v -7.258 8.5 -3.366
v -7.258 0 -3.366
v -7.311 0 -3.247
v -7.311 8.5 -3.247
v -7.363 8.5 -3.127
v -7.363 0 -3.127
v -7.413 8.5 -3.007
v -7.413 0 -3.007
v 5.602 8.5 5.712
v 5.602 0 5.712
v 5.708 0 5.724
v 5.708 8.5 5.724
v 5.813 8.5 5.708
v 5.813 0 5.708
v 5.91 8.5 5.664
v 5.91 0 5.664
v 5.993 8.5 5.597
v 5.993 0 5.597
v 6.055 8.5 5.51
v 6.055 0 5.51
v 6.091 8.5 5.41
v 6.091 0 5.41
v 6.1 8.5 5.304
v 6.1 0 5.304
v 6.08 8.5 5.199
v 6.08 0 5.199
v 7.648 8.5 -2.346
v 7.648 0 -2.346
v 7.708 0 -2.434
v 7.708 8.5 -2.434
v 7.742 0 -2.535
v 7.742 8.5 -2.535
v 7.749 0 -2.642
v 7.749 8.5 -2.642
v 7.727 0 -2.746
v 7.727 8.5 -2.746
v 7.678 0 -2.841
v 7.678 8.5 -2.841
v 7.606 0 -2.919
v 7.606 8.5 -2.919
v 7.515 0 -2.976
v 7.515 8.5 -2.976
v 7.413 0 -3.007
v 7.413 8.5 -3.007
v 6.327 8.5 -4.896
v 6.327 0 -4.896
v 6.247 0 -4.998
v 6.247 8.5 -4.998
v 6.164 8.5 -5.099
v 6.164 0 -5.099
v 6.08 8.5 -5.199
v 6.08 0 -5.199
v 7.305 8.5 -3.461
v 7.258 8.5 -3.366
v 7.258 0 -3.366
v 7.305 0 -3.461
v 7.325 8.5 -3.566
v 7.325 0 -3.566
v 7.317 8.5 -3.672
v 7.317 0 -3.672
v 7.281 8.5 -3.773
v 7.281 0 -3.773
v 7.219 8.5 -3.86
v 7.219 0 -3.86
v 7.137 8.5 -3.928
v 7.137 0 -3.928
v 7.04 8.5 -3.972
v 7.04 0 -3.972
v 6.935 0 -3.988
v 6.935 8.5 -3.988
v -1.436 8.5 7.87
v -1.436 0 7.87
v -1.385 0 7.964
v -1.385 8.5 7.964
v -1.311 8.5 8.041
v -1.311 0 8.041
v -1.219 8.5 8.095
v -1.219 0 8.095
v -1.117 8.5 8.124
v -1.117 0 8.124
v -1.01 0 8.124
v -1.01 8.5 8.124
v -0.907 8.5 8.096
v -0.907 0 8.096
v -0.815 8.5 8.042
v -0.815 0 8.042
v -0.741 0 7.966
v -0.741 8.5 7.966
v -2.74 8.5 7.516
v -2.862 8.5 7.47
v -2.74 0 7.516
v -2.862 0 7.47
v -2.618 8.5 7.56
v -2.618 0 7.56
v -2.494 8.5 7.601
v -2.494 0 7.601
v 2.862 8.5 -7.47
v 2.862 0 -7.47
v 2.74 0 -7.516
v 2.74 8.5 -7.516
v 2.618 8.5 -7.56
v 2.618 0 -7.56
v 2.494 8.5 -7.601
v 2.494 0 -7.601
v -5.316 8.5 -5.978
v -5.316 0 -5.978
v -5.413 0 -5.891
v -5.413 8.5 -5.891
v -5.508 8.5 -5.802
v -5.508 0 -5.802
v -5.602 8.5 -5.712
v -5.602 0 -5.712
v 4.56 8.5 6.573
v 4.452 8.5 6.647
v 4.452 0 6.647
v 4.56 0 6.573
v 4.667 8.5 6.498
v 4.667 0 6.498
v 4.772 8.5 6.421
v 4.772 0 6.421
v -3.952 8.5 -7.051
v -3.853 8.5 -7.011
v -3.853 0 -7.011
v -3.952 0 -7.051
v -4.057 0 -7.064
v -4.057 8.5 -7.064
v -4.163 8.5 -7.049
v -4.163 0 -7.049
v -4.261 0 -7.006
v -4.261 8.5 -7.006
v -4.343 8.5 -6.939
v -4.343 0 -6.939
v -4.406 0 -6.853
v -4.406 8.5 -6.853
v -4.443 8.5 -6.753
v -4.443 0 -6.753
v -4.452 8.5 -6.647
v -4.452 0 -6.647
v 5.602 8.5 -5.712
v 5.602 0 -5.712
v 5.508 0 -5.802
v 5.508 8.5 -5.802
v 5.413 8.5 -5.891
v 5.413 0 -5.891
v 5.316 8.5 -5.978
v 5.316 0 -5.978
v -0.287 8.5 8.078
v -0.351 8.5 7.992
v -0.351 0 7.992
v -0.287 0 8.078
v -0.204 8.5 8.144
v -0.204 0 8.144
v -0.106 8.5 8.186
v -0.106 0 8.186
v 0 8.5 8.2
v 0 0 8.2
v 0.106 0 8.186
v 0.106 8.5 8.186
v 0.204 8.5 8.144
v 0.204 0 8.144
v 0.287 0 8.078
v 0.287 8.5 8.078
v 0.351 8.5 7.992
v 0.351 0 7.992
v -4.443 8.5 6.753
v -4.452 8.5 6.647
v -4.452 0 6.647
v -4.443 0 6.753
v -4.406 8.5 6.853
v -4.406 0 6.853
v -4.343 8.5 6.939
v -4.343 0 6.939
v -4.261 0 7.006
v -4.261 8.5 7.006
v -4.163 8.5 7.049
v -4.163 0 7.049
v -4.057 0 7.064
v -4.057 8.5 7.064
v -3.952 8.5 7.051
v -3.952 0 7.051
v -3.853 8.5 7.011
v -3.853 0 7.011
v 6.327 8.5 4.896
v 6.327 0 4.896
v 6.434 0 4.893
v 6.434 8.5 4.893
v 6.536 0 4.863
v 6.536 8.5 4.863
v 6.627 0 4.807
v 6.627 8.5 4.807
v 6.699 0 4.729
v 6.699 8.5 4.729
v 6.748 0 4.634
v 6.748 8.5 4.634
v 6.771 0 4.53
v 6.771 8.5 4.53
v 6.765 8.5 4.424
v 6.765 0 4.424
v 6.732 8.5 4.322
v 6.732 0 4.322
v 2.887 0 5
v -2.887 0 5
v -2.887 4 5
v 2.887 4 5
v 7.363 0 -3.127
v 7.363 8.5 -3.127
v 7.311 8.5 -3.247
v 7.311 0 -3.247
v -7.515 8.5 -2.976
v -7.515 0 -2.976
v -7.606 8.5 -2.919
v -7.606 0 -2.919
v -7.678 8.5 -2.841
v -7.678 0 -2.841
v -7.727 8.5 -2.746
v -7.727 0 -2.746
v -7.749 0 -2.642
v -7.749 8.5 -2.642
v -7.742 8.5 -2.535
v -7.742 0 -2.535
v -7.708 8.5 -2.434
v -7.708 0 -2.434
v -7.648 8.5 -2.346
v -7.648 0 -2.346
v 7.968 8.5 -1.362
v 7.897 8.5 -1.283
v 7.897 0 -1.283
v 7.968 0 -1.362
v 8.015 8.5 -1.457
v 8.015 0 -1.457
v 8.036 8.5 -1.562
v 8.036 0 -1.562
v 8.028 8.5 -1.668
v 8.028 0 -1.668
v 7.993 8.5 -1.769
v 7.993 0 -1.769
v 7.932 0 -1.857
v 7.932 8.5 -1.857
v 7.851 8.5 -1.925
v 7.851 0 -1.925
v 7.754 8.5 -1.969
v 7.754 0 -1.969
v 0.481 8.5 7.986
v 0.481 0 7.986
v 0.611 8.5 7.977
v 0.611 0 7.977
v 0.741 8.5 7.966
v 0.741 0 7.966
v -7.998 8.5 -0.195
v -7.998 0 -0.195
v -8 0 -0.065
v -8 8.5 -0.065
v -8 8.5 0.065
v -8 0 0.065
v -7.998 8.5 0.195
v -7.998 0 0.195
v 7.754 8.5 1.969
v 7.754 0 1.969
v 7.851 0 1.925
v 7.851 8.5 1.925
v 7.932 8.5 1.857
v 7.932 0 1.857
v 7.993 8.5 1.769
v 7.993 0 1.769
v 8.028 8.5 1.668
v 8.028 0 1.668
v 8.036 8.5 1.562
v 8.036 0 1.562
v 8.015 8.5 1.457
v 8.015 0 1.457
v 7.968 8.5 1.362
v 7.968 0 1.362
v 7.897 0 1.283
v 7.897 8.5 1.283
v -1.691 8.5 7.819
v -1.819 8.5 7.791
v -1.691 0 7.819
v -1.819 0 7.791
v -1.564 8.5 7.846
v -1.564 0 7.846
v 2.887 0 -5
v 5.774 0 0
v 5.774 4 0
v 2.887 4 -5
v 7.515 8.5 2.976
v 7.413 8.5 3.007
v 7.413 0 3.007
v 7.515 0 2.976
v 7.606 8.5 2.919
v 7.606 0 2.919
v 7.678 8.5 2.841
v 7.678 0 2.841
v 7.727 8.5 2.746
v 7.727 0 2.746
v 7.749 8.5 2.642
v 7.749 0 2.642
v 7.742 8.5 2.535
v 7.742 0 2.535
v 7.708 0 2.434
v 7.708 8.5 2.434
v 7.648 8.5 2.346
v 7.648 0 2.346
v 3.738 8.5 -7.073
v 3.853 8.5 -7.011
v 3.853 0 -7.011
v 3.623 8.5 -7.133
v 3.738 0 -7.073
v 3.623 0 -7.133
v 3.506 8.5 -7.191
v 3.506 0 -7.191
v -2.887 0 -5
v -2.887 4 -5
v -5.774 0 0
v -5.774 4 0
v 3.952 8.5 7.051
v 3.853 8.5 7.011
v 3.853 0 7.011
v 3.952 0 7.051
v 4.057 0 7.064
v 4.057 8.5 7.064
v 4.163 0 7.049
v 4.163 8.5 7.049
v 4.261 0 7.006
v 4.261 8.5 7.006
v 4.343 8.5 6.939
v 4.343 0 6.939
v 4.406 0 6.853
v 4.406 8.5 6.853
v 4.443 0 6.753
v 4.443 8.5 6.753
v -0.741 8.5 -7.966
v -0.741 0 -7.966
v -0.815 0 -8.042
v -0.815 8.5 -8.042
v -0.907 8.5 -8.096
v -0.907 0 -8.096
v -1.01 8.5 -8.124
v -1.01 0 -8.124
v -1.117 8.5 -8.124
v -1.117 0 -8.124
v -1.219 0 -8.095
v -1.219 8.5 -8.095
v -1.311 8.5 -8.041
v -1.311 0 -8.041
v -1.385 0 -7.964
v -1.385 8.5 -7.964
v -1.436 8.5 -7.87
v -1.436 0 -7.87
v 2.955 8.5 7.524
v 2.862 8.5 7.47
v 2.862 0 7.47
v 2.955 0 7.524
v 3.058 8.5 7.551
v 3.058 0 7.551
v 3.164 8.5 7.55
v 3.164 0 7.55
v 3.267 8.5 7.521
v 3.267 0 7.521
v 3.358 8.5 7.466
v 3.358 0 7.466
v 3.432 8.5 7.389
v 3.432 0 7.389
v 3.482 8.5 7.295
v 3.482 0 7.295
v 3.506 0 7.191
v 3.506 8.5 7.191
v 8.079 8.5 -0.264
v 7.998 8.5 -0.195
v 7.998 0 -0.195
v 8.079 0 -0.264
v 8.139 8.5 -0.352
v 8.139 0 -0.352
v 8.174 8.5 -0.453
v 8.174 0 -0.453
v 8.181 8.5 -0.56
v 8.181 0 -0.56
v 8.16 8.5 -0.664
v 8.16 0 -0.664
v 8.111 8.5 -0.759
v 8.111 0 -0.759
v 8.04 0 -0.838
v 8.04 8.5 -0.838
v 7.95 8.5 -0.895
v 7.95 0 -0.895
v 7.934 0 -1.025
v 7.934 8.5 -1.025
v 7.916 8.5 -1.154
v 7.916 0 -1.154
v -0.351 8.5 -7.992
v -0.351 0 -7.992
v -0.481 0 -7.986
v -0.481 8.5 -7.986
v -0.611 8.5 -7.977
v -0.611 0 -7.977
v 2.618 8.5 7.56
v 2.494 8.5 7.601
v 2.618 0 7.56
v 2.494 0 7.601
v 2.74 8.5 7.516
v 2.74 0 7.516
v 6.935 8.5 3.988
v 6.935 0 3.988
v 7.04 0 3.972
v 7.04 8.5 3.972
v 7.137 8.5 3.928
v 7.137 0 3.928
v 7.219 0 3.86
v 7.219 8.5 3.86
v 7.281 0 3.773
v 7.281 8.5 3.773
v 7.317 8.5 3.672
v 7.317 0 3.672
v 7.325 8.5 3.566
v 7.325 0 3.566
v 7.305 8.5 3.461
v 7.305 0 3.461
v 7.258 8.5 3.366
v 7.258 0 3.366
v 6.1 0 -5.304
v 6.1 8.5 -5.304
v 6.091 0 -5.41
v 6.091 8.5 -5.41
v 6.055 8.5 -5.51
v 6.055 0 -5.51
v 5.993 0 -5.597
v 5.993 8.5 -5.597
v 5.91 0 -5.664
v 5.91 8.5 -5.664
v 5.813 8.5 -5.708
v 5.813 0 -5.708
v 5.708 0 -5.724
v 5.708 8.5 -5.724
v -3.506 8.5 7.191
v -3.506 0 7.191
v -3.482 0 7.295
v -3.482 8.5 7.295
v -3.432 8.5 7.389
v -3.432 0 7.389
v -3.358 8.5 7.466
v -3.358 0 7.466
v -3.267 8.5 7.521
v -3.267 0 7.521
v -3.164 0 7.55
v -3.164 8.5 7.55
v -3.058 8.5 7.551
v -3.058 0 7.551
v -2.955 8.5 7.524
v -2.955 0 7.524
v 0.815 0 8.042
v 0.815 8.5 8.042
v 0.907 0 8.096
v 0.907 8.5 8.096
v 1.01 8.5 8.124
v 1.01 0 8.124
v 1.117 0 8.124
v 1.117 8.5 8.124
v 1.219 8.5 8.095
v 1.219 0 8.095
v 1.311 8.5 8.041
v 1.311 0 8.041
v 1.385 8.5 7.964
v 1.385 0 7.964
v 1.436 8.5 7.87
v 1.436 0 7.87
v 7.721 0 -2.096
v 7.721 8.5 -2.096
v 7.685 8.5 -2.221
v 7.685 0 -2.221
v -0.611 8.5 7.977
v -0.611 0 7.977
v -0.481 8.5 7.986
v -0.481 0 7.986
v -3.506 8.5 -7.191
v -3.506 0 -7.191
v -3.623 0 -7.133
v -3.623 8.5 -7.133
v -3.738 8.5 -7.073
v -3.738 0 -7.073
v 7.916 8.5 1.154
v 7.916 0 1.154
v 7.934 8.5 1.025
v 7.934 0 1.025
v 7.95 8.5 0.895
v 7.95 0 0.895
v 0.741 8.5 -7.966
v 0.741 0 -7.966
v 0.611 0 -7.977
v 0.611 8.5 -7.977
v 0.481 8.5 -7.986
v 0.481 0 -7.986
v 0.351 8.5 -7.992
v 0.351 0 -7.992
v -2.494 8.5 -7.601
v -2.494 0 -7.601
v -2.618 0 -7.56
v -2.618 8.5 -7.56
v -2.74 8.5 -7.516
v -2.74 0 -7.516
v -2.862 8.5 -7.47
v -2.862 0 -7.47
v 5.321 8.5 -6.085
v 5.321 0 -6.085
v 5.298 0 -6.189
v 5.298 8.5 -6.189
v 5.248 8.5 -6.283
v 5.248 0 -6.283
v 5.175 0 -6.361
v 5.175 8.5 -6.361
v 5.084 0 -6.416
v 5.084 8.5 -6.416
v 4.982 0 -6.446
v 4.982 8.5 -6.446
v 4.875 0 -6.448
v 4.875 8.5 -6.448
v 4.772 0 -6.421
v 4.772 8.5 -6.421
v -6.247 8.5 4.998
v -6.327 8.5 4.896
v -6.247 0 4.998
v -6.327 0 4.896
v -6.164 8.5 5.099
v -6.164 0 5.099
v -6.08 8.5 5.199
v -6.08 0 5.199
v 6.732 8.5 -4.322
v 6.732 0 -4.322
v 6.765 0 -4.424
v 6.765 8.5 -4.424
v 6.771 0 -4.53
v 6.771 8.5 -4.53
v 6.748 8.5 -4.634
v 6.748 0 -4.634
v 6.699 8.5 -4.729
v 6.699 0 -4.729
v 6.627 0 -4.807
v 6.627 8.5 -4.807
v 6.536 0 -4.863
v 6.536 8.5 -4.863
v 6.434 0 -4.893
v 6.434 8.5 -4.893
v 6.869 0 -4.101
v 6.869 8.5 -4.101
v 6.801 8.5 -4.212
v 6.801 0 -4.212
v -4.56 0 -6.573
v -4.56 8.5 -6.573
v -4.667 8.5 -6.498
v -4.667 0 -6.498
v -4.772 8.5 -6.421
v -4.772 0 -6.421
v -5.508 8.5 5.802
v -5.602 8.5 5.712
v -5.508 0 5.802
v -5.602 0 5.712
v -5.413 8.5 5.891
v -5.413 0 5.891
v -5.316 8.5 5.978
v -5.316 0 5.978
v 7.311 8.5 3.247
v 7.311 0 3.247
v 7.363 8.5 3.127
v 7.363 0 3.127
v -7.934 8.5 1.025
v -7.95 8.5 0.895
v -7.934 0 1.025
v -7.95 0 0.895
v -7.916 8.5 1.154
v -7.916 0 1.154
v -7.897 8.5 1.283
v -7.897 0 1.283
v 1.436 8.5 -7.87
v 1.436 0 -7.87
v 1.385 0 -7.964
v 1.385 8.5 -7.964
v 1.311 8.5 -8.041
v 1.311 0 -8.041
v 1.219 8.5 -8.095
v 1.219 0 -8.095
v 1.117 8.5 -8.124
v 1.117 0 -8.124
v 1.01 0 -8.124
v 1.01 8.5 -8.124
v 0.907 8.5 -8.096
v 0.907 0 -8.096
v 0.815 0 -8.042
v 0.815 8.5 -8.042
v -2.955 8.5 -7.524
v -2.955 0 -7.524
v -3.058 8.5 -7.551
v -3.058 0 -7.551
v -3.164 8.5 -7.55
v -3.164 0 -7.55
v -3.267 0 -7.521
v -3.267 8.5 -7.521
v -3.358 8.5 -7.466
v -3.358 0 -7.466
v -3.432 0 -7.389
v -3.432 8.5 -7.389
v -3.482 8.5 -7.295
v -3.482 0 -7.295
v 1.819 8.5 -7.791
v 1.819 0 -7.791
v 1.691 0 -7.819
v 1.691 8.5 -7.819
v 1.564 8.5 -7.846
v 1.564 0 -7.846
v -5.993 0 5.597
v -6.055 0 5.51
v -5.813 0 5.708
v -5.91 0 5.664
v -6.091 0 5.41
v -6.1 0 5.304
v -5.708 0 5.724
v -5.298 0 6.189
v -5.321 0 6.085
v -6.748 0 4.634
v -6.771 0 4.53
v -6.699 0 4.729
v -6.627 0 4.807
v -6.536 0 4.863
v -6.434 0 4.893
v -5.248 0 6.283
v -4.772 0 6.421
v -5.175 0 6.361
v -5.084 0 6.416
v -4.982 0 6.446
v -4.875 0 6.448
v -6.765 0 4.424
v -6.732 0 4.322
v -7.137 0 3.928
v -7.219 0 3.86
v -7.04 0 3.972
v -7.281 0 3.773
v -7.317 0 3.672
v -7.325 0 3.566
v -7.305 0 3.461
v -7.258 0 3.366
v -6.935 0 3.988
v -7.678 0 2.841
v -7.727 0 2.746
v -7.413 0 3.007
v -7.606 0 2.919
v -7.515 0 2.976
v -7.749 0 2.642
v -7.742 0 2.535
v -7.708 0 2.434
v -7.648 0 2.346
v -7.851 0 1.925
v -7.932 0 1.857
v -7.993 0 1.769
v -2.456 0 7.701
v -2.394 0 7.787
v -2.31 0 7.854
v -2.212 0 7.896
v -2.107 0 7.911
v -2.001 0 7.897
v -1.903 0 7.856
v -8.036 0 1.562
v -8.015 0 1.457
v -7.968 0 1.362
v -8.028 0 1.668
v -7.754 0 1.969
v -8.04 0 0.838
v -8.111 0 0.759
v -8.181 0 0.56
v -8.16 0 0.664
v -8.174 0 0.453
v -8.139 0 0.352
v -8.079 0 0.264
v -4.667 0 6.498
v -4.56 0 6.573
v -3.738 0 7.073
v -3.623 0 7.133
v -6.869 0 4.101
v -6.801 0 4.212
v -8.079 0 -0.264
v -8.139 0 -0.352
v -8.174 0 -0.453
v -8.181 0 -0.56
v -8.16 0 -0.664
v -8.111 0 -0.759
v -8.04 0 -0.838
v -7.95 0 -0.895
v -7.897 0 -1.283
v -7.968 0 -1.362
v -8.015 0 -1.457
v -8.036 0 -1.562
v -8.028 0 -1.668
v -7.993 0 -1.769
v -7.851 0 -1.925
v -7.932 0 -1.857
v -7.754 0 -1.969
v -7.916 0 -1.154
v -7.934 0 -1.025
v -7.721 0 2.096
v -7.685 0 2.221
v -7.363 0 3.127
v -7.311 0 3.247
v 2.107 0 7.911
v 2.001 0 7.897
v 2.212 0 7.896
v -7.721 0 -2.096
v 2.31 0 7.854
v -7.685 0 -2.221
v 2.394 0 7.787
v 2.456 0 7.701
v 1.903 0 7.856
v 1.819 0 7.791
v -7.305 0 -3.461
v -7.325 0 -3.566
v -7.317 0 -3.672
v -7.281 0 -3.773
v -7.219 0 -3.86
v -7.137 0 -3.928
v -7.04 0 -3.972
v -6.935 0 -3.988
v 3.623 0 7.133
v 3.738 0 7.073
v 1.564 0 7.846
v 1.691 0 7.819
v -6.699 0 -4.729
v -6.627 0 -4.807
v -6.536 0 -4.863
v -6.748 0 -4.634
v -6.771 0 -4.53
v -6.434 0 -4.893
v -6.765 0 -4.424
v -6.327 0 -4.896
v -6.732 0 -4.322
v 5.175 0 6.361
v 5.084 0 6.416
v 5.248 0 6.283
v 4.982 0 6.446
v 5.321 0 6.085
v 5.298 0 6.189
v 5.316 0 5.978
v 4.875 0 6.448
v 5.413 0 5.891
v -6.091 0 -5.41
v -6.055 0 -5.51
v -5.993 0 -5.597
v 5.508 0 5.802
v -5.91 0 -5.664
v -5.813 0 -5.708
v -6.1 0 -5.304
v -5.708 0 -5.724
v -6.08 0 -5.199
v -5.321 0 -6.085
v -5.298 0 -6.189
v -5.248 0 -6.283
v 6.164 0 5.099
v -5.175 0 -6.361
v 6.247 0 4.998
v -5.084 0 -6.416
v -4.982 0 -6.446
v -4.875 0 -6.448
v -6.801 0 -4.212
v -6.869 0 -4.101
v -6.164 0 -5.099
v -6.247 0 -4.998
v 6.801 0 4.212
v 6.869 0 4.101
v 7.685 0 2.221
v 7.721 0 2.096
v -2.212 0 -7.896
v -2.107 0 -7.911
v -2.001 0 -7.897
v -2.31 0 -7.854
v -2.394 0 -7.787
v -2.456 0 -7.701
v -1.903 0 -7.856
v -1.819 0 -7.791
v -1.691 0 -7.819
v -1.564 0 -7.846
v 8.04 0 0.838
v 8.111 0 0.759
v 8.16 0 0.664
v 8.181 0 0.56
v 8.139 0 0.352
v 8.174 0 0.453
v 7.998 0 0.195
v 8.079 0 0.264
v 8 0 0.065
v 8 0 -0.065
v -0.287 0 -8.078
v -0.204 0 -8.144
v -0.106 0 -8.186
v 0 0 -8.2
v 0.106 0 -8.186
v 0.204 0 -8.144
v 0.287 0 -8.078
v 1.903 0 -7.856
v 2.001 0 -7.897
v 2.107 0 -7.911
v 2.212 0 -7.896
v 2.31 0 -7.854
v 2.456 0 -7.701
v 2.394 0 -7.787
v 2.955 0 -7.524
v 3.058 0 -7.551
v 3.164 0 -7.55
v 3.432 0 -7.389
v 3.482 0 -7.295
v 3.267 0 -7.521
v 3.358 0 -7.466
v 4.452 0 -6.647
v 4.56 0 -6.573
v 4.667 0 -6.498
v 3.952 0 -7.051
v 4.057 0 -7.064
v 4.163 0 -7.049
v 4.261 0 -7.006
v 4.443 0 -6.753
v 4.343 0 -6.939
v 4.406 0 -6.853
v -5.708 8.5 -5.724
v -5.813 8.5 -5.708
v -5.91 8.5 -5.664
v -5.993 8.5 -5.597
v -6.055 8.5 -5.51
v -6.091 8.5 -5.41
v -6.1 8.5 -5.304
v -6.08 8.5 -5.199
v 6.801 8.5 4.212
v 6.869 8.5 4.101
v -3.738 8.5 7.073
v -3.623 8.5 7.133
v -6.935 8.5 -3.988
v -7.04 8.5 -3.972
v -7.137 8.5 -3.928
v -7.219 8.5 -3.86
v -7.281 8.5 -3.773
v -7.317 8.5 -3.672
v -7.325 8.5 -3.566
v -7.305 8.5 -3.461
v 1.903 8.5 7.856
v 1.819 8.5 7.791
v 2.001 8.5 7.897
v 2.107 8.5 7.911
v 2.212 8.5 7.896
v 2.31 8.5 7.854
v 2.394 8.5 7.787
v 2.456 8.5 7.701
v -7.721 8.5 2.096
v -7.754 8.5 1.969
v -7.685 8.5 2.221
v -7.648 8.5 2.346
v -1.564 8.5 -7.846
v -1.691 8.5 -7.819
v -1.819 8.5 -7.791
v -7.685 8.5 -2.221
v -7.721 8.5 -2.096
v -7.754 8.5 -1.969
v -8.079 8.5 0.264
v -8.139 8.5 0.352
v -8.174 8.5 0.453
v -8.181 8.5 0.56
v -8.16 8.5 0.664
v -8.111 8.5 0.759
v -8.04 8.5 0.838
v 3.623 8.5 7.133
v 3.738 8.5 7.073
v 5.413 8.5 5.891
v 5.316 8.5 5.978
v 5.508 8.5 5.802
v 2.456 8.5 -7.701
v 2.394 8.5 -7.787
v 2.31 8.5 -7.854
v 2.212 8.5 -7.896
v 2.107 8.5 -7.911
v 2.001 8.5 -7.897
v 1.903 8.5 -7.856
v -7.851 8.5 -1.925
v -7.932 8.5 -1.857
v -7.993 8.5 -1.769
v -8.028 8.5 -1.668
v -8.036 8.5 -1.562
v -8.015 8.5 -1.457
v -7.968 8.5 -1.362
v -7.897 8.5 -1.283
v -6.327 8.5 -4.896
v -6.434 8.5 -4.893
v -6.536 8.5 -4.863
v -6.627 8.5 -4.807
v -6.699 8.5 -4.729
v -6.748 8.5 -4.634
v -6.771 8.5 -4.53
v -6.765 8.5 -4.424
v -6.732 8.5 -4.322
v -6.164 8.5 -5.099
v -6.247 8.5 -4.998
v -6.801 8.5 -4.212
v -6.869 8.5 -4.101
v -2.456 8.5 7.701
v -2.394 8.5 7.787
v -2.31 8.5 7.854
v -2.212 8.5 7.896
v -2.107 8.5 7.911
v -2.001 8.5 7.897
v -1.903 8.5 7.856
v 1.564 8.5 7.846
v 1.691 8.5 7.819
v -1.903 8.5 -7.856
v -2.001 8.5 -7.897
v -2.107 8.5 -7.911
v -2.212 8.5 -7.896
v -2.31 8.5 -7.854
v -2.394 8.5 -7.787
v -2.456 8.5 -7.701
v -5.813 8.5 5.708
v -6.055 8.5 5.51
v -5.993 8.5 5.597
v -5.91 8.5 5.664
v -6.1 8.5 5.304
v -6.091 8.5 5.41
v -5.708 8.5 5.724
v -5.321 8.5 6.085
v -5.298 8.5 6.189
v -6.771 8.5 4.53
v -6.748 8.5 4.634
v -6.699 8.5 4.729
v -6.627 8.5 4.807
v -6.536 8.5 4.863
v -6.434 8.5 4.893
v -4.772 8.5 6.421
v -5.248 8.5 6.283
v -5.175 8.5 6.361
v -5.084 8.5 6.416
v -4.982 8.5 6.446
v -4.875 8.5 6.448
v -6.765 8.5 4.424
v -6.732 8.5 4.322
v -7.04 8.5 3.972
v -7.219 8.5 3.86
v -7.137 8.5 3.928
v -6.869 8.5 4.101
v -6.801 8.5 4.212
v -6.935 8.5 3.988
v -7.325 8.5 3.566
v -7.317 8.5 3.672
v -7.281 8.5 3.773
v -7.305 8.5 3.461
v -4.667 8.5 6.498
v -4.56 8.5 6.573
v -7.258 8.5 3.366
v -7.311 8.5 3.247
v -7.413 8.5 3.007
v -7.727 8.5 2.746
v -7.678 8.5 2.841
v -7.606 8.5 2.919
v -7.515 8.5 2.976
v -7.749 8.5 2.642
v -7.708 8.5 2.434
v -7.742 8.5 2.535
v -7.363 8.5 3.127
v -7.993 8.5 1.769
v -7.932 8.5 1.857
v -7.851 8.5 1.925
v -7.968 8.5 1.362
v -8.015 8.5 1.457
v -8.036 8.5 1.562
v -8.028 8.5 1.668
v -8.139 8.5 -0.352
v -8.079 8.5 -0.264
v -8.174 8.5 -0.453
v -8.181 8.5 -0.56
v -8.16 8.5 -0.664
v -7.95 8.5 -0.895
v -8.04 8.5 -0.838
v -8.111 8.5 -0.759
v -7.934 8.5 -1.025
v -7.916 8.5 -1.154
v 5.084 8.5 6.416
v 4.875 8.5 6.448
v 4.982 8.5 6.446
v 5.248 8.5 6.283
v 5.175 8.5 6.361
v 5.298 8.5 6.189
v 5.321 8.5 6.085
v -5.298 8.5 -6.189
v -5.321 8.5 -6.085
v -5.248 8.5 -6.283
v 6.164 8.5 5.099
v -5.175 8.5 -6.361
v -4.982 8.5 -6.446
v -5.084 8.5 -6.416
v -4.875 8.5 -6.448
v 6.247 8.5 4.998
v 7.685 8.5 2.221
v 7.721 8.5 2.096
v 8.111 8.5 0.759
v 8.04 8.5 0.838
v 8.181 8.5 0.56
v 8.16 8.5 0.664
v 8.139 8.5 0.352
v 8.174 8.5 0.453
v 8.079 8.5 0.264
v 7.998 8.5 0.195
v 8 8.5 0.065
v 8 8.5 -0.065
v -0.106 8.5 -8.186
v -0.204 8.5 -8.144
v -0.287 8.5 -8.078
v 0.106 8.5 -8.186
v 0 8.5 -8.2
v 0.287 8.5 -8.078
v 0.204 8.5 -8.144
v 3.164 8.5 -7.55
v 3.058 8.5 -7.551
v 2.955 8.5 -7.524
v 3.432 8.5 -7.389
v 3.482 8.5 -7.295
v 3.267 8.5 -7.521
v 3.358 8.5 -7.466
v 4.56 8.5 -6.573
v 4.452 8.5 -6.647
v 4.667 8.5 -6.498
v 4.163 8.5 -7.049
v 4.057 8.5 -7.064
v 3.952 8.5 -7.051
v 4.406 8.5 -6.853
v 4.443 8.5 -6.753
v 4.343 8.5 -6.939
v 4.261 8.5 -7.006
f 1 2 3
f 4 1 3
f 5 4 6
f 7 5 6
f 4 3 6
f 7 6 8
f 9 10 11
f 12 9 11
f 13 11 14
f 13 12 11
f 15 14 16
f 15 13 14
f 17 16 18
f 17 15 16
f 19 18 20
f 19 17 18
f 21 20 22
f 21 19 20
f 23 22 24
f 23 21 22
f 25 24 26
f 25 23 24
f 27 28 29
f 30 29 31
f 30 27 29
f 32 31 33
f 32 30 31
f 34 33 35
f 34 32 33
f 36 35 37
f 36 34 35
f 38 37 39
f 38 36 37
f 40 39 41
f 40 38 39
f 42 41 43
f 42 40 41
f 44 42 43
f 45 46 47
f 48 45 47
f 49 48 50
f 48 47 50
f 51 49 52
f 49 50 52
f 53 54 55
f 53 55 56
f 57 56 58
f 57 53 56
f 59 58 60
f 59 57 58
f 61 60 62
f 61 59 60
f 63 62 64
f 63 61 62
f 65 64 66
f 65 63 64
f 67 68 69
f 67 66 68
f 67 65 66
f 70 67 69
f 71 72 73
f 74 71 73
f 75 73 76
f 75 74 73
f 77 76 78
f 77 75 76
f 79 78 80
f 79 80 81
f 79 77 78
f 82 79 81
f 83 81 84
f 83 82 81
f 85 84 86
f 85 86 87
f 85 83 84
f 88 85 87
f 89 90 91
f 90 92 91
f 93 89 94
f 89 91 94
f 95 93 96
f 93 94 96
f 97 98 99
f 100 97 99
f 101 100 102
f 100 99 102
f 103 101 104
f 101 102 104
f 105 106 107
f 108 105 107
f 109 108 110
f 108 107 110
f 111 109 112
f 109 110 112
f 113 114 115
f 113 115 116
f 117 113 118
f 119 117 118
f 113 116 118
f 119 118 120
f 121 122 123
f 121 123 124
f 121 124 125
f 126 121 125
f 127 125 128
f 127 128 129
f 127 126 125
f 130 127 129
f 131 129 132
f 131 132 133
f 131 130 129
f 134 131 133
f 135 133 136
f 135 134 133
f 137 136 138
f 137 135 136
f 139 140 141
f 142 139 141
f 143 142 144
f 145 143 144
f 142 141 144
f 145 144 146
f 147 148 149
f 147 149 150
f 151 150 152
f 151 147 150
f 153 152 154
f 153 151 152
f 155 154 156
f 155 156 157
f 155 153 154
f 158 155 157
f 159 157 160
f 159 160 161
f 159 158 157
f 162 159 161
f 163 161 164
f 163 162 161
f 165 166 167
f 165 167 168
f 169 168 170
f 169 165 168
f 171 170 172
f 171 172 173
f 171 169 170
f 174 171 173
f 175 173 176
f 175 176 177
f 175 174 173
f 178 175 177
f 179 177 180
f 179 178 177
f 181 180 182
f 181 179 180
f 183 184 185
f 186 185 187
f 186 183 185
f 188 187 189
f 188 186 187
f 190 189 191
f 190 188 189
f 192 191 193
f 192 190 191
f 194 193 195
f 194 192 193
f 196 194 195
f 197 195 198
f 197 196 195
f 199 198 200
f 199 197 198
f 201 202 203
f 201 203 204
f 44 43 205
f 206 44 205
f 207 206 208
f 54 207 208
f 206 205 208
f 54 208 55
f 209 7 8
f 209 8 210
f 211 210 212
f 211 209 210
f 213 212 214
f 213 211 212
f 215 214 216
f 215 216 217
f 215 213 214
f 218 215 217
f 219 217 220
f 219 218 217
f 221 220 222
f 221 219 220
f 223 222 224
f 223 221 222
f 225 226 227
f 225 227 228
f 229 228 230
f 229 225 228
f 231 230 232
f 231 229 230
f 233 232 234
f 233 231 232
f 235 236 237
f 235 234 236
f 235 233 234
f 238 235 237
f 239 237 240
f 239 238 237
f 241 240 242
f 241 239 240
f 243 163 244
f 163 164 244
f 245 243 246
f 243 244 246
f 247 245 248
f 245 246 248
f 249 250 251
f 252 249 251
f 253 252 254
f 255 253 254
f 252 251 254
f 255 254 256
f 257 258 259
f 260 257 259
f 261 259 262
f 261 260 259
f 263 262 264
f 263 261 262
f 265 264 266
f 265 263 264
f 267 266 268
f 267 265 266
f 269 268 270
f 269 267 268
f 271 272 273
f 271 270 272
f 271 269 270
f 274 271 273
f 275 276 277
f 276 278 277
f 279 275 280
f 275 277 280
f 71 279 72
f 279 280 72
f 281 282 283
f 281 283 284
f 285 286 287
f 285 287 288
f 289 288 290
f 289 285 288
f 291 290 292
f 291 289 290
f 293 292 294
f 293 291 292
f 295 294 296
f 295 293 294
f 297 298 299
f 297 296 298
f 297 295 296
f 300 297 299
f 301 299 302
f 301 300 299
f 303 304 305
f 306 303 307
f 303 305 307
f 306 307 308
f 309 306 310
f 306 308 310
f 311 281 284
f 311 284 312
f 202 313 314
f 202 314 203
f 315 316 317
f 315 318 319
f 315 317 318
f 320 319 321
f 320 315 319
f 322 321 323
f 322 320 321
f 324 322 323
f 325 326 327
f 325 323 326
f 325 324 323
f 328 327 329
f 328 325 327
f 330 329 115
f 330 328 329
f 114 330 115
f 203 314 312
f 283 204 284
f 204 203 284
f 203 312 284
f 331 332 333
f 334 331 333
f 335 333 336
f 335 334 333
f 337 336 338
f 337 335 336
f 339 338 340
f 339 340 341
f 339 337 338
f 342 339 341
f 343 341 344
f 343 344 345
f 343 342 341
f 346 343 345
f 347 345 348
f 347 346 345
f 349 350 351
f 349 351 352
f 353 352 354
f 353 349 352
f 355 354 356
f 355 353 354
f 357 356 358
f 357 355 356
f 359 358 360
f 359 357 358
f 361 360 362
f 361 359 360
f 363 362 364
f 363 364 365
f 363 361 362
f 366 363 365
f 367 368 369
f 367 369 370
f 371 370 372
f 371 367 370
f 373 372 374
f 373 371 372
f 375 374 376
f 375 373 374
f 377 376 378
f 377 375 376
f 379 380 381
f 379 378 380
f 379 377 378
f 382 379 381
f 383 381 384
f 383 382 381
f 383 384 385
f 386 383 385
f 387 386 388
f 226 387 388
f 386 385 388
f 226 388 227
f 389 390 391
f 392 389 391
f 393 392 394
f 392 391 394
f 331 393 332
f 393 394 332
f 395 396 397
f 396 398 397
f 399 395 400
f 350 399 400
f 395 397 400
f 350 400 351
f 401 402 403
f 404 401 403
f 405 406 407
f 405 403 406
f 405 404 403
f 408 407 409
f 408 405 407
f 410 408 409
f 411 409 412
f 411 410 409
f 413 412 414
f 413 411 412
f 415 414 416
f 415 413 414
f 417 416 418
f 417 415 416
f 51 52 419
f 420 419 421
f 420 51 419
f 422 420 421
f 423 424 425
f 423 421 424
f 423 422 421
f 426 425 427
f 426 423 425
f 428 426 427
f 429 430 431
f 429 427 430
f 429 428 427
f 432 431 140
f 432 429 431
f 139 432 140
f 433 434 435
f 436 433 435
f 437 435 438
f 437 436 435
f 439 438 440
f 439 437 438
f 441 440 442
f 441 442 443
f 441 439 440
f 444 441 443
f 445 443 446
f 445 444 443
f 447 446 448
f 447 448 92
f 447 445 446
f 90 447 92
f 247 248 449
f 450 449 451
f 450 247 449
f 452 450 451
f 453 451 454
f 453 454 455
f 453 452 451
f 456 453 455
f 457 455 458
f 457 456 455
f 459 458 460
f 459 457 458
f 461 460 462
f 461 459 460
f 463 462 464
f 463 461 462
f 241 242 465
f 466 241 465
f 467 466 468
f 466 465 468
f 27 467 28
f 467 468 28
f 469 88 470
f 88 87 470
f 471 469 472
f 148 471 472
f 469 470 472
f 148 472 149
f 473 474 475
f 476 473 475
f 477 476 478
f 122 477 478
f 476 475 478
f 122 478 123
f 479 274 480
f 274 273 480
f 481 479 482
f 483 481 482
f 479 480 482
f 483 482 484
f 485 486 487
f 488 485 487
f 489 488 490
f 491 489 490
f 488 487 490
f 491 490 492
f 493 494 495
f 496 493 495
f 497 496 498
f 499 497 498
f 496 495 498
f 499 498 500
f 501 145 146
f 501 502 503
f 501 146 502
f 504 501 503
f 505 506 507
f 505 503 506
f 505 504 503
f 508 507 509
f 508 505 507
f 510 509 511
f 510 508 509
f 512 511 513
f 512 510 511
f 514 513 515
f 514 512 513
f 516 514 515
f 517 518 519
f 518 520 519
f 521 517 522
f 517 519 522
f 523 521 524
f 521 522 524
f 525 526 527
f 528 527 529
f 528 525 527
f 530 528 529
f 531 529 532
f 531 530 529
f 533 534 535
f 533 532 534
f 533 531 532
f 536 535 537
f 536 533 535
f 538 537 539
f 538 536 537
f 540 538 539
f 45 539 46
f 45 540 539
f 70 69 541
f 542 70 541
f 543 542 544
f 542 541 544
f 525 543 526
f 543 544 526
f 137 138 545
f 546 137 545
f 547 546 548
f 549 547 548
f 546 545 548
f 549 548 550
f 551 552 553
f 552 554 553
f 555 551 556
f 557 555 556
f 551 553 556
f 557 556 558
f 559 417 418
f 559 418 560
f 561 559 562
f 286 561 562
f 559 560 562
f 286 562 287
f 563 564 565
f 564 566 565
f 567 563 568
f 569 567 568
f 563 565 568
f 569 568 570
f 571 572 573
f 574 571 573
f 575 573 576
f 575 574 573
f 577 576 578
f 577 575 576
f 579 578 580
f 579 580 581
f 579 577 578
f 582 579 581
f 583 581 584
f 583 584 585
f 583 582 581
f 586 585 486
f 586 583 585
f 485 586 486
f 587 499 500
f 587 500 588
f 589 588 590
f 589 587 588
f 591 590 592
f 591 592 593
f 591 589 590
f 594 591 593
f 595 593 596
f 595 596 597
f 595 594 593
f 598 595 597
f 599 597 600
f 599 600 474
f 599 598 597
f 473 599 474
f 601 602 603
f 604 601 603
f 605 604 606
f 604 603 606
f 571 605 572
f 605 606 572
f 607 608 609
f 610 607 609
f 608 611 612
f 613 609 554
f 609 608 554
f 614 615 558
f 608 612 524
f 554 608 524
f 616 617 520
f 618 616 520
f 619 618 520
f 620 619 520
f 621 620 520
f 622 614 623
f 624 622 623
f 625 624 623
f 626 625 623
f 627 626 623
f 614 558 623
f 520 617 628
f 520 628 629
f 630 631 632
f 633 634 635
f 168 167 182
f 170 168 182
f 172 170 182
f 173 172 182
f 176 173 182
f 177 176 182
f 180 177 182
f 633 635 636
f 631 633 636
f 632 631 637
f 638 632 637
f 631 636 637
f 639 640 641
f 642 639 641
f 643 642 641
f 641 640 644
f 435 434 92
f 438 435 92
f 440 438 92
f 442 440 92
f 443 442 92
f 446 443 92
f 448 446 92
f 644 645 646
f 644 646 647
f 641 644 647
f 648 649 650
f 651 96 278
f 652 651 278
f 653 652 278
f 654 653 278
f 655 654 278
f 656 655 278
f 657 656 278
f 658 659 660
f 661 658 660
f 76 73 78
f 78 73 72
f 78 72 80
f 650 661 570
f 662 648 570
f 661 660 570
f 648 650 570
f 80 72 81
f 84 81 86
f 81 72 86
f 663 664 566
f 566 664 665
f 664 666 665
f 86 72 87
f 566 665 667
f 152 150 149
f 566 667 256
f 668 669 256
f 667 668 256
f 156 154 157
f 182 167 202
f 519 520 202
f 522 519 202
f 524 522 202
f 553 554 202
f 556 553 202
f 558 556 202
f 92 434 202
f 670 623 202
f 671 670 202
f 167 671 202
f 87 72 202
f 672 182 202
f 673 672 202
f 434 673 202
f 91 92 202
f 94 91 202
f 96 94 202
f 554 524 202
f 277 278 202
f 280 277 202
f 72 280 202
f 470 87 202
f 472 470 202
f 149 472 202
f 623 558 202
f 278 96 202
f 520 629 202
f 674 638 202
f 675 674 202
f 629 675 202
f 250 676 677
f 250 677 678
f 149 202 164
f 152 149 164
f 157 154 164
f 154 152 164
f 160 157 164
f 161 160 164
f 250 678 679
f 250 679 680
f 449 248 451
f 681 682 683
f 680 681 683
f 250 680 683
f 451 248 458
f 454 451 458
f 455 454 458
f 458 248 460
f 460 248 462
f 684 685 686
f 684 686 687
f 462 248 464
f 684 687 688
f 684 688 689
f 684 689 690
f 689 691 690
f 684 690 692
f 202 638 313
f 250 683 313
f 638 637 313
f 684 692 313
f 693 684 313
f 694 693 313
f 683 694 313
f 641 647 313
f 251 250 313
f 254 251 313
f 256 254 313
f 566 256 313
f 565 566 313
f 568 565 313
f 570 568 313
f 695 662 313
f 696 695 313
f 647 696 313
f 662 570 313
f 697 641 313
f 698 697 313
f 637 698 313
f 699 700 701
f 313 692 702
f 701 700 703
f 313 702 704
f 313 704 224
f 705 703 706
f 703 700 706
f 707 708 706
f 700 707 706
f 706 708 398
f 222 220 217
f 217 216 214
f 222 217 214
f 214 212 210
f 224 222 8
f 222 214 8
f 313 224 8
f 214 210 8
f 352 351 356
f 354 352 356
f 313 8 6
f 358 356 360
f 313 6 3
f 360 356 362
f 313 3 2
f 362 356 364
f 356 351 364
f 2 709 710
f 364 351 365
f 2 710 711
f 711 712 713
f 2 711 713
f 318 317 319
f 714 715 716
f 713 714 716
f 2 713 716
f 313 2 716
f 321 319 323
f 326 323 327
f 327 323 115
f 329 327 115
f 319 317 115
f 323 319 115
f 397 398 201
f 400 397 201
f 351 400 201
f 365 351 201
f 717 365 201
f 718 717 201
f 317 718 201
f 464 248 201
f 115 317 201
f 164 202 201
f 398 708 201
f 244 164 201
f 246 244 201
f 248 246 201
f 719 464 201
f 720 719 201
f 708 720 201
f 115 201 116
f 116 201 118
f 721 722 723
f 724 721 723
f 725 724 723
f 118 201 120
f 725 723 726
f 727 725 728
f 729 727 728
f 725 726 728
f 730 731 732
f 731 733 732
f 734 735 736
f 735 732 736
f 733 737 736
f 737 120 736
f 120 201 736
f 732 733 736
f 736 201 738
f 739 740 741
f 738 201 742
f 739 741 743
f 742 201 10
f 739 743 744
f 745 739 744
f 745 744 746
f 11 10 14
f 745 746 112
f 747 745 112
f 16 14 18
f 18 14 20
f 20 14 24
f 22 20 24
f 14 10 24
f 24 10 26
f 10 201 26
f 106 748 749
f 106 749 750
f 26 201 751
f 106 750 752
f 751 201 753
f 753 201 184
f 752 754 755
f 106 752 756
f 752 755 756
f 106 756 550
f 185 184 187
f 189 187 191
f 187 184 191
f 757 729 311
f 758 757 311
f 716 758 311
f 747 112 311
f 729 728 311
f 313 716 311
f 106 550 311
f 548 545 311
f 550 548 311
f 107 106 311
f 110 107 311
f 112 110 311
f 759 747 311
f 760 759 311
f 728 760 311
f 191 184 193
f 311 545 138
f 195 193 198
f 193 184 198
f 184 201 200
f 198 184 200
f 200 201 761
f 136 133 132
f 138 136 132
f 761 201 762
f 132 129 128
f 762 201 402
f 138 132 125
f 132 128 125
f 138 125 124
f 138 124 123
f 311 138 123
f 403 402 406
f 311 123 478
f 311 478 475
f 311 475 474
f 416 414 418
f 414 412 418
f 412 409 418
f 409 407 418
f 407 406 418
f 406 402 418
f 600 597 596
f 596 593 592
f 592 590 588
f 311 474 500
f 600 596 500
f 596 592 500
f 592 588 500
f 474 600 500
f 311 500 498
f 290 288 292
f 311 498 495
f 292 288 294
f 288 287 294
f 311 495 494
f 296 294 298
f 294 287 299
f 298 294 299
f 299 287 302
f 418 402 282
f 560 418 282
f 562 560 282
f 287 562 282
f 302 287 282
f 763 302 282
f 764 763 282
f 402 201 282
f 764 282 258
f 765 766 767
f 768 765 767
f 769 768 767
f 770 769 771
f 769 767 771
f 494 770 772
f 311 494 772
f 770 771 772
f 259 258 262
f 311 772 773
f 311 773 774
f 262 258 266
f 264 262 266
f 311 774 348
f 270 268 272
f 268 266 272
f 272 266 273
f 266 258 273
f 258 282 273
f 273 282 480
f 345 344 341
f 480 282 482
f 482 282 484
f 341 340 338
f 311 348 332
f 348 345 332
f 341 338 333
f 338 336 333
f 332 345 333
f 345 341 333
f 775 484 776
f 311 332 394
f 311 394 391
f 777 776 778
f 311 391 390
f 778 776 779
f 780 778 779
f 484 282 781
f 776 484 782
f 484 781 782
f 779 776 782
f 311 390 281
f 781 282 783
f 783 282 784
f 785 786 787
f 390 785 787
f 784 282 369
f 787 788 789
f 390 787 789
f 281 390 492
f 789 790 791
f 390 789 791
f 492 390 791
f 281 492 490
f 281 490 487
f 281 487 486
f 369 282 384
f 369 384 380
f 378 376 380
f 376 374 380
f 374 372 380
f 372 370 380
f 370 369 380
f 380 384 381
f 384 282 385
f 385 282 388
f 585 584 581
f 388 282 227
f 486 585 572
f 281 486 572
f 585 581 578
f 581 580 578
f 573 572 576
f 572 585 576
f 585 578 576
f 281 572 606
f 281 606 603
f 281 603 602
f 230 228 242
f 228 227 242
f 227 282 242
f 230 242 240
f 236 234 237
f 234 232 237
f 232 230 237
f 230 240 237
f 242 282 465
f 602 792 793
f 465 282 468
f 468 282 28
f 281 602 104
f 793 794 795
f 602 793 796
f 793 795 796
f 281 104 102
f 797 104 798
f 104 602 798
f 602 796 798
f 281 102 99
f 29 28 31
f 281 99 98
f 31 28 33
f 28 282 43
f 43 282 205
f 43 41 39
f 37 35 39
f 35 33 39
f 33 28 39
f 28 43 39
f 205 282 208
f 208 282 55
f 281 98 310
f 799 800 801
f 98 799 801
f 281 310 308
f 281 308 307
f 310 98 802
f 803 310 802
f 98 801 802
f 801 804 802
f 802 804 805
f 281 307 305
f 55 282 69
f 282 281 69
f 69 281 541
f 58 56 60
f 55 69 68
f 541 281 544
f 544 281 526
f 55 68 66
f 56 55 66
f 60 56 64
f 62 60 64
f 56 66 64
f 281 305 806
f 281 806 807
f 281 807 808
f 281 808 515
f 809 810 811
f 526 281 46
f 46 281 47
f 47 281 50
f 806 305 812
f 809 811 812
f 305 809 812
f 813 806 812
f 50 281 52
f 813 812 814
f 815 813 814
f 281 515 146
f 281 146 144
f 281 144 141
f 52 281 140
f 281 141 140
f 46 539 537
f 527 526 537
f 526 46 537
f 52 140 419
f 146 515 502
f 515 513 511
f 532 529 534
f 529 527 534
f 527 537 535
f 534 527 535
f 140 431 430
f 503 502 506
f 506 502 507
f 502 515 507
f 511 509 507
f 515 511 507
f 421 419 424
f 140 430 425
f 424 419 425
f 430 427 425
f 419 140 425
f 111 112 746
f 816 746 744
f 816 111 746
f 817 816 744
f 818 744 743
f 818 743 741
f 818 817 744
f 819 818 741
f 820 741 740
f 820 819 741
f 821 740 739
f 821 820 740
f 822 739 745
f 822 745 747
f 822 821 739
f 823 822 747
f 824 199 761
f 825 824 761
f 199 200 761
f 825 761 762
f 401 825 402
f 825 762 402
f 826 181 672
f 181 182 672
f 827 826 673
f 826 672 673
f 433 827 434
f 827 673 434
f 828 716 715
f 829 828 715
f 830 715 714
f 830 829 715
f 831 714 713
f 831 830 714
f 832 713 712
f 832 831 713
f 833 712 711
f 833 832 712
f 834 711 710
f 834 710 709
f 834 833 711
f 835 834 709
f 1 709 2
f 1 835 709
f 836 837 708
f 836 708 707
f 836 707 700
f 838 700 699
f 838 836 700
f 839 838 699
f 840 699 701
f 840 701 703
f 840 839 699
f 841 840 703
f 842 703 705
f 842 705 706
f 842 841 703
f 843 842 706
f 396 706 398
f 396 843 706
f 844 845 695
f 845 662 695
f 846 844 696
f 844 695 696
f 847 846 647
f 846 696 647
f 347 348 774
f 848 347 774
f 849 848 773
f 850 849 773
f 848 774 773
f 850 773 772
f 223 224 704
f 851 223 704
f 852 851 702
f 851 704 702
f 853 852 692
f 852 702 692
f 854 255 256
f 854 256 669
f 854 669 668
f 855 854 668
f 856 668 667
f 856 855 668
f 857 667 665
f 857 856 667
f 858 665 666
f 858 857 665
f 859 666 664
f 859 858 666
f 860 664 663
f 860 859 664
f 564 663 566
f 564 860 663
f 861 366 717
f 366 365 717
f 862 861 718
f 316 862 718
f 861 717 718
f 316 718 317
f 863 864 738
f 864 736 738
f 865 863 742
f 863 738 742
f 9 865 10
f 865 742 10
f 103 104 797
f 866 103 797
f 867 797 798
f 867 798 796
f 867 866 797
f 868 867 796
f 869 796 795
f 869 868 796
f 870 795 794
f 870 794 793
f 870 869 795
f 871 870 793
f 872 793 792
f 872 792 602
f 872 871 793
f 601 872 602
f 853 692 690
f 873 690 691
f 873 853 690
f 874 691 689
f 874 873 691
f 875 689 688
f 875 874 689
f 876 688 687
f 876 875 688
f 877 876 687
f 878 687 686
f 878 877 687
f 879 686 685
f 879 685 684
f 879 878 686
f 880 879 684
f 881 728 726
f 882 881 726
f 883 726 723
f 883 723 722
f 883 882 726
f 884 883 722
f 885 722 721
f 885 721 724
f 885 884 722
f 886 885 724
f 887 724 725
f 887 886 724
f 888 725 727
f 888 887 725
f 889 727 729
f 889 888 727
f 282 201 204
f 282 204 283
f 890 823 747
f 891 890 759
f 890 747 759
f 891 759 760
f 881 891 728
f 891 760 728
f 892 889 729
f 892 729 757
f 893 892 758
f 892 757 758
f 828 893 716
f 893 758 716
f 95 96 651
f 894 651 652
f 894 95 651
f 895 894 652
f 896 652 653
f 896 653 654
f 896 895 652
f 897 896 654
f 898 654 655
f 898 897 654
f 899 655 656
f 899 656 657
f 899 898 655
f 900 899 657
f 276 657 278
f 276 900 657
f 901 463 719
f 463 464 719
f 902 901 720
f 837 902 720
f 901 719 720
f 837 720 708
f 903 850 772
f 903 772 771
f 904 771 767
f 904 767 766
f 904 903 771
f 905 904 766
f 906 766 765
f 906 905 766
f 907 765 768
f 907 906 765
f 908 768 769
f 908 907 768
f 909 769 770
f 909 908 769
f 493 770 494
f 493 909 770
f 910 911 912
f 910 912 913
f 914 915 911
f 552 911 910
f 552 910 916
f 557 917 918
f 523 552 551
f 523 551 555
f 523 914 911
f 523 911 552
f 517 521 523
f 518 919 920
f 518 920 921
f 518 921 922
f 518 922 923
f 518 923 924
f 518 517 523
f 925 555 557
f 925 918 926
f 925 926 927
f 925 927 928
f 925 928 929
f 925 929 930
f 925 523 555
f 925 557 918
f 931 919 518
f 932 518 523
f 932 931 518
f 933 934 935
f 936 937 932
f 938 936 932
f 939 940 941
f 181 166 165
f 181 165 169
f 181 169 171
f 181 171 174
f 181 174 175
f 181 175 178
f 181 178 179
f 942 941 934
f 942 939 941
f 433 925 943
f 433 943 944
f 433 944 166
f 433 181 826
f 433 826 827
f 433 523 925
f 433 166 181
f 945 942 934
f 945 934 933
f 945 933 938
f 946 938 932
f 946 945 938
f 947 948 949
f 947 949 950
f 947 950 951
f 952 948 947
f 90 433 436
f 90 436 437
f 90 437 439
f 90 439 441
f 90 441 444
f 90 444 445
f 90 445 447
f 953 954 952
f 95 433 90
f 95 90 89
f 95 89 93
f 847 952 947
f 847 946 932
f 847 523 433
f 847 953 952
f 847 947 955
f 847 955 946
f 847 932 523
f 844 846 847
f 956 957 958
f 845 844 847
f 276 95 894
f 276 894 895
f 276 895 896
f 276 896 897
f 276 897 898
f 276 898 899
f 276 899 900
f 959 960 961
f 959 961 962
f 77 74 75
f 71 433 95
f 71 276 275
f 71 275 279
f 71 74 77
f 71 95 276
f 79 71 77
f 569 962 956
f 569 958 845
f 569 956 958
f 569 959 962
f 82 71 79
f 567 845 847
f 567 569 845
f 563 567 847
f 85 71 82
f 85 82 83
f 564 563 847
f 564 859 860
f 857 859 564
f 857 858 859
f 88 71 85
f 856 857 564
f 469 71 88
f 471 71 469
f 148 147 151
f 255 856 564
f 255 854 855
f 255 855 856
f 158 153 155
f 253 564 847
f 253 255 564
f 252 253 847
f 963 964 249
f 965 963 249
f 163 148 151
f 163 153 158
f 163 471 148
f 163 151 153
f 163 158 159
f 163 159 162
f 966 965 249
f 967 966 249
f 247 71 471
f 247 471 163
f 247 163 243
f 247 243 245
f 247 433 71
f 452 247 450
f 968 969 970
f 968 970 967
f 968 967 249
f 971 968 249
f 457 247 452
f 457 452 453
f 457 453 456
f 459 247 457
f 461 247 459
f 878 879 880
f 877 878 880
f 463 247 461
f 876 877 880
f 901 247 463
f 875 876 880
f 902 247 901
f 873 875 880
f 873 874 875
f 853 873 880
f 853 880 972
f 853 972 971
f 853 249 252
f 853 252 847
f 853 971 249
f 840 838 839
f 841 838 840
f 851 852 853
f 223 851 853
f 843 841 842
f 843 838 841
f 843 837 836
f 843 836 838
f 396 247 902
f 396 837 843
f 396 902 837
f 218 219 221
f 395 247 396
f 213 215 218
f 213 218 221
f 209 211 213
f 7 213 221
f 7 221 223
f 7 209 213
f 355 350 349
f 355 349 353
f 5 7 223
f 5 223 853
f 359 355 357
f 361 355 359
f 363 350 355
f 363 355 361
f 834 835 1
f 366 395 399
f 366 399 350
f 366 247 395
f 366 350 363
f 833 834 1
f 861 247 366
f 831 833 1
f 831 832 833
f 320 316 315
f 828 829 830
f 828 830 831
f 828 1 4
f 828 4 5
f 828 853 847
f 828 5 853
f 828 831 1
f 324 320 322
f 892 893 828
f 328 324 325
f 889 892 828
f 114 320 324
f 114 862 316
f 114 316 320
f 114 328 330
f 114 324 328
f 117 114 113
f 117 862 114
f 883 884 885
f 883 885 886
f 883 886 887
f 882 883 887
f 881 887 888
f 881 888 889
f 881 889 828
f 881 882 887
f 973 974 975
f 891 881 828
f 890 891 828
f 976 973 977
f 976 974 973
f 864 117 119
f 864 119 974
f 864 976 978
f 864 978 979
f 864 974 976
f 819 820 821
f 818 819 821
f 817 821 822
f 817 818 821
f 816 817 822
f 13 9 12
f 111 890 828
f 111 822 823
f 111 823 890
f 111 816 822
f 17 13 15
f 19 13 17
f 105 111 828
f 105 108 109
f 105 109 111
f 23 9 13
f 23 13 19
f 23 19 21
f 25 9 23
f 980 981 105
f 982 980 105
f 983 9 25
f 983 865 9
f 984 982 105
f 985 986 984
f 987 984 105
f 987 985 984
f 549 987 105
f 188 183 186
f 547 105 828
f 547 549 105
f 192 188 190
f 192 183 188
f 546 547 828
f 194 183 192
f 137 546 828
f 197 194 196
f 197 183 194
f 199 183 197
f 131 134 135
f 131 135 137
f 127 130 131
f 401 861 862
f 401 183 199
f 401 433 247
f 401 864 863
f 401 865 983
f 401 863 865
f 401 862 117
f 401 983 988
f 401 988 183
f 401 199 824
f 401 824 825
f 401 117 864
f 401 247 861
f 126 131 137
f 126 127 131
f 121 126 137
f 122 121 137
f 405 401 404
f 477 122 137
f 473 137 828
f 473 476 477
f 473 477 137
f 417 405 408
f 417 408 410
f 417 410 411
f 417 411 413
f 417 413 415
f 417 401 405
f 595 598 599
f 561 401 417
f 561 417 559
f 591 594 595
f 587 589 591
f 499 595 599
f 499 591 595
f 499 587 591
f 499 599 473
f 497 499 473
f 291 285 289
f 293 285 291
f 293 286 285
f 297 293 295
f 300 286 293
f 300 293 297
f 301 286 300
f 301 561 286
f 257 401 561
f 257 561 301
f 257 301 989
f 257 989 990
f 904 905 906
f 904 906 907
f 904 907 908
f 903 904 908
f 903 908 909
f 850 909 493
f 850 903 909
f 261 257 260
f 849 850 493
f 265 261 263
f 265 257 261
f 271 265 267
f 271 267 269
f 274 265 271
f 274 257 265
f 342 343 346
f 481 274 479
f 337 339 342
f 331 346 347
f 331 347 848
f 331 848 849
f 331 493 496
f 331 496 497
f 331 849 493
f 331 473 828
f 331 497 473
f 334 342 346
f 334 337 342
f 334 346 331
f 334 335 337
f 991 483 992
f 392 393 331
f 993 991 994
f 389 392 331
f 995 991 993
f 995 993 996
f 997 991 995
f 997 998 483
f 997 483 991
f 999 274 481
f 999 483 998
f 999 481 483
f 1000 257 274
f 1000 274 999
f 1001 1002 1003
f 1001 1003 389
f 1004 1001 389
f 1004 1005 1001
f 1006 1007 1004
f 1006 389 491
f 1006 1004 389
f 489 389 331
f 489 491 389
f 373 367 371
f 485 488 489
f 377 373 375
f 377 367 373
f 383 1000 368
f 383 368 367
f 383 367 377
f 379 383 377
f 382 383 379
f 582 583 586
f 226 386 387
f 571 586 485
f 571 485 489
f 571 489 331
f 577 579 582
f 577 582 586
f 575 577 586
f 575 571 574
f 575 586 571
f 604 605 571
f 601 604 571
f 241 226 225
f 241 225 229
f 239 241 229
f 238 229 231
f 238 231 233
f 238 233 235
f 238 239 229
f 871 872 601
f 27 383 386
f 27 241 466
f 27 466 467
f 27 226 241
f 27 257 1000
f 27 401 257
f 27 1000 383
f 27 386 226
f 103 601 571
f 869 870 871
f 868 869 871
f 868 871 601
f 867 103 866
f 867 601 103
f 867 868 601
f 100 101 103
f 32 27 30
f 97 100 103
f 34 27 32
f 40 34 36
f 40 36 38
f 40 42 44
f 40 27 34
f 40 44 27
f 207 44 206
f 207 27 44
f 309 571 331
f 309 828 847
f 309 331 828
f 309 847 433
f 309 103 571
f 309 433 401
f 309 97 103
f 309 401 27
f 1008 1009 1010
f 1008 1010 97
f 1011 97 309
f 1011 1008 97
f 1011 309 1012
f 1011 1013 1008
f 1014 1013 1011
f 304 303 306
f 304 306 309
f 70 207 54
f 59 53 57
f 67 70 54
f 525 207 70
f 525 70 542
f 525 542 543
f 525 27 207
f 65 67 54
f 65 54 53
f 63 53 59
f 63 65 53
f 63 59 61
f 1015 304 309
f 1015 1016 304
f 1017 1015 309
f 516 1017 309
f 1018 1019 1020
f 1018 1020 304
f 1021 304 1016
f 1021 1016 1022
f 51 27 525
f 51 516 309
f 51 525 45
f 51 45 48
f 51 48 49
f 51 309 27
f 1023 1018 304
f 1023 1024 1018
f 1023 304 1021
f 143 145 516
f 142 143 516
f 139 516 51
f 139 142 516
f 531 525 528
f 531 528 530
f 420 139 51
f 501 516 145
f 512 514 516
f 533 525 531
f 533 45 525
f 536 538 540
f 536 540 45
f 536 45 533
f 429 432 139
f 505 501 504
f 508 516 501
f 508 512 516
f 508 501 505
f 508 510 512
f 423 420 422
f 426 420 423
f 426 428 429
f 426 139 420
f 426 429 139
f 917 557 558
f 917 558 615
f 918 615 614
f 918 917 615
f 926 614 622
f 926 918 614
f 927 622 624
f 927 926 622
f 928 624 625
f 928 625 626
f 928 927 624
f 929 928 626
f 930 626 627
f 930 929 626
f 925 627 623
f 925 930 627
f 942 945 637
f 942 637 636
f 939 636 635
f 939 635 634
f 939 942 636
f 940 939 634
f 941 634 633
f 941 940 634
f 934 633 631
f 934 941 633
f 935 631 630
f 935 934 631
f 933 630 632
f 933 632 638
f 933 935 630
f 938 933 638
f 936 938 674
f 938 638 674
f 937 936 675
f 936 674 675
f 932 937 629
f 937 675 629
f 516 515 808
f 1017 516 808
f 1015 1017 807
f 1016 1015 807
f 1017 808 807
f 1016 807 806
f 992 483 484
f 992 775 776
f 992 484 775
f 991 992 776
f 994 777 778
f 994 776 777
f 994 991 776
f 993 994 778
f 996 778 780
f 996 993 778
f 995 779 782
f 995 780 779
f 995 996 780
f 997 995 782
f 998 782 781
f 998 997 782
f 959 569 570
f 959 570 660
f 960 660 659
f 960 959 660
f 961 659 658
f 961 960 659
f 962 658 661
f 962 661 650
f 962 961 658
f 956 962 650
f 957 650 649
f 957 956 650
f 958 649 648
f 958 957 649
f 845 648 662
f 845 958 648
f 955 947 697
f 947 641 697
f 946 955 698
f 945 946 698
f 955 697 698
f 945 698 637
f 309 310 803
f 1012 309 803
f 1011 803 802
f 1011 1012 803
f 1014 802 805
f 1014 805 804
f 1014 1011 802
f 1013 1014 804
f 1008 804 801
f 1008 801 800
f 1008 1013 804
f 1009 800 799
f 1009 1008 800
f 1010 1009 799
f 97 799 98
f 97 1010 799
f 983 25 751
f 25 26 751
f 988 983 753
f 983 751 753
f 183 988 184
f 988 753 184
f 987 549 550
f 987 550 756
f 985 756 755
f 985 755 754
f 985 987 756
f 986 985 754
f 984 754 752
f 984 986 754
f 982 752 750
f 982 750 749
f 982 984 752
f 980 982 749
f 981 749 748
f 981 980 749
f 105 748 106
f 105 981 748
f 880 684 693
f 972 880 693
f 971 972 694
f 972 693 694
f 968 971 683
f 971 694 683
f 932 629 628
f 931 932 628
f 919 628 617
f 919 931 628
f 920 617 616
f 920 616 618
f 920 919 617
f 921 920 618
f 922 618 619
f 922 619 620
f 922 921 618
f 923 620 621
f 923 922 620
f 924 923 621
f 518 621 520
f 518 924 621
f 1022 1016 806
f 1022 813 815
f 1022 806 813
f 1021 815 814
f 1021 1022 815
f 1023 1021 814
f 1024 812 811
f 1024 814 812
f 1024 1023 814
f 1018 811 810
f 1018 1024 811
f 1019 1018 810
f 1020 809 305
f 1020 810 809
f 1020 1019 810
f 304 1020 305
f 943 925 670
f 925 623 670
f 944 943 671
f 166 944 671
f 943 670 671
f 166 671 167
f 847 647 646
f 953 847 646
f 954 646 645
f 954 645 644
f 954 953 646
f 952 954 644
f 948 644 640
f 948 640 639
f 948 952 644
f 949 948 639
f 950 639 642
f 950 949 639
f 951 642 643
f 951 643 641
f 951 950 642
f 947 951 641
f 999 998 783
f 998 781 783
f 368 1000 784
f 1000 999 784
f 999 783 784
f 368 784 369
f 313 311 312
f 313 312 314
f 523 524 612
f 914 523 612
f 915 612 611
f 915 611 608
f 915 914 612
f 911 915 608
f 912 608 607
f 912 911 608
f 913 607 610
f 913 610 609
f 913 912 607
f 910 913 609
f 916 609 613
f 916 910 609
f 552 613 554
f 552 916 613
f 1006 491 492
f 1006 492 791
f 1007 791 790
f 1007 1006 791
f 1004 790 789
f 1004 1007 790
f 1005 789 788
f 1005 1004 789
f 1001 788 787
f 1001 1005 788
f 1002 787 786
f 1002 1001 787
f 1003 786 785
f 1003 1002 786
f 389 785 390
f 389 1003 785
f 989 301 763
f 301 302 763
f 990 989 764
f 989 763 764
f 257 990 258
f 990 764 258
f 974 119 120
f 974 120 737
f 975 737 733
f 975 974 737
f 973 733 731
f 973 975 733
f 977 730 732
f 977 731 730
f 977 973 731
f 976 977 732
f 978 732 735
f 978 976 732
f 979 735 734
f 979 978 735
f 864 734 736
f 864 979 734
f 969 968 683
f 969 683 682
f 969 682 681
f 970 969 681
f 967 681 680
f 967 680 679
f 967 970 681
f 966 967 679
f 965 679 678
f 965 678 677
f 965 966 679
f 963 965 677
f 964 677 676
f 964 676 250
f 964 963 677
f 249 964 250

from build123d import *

# Parameters (mm, degrees)
SKETCH1_R           = 8
BOSS_EXTRUDE1_DEPTH = 4
SKETCH3_R           = 8
BOSS_EXTRUDE3_DEPTH = 4.5
SKETCH2_R           = 0.4
BOSS_EXTRUDE2_DEPTH = 8.5


with BuildPart() as part:
    # Sketch1 → Boss-Extrude1 (new body)
    with BuildSketch(Plane(origin=(0, 0, 0), x_dir=(1, 0, 0), z_dir=(0, 1, 0))):
        Circle(SKETCH1_R)
        Polygon((5.773502692, 0), (2.886751346, 5), (-2.886751346, 5), (-5.773502692, 0), (-2.886751346, -5), (2.886751346, -5), align=None, mode=Mode.SUBTRACT)
    extrude(amount=BOSS_EXTRUDE1_DEPTH)

    # Sketch3 → Boss-Extrude3 (add)
    with BuildSketch(Plane(origin=(0, 4, 0), x_dir=(1, 0, 0), z_dir=(0, 1, 0))):
        Circle(SKETCH3_R)
    extrude(amount=BOSS_EXTRUDE3_DEPTH)

    # Sketch2 → Boss-Extrude2 (add, through all)
    with BuildSketch(Plane(origin=(0, 8.5, 0), x_dir=(1, 0, 0), z_dir=(0, 1, 0))):
        with Locations((0, 7.8)):
            Circle(SKETCH2_R)
        with Locations((1.062099863, 7.727350379)):
            Circle(SKETCH2_R)
        with Locations((2.104414815, 7.510754841)):
            Circle(SKETCH2_R)
        with Locations((3.107528501, 7.154248152)):
            Circle(SKETCH2_R)
        with Locations((4.05275481, 6.664471355)):
            Circle(SKETCH2_R)
        with Locations((4.922485966, 6.050548067)):
            Circle(SKETCH2_R)
        with Locations((5.700520521, 5.323914517)):
            Circle(SKETCH2_R)
        with Locations((6.372365165, 4.498106512)):
            Circle(SKETCH2_R)
        with Locations((6.925504704, 3.588507294)):
            Circle(SKETCH2_R)
        with Locations((7.349635193, 2.612060975)):
            Circle(SKETCH2_R)
        with Locations((7.636855884, 1.586956902)):
            Circle(SKETCH2_R)
        with Locations((7.7818164, 0.532290824)):
            Circle(SKETCH2_R)
        with Locations((7.7818164, -0.532290824)):
            Circle(SKETCH2_R)
        with Locations((7.636855884, -1.586956902)):
            Circle(SKETCH2_R)
        with Locations((7.349635193, -2.612060975)):
            Circle(SKETCH2_R)
        with Locations((6.925504704, -3.588507294)):
            Circle(SKETCH2_R)
        with Locations((6.372365165, -4.498106512)):
            Circle(SKETCH2_R)
        with Locations((5.700520521, -5.323914517)):
            Circle(SKETCH2_R)
        with Locations((4.922485966, -6.050548067)):
            Circle(SKETCH2_R)
        with Locations((4.05275481, -6.664471355)):
            Circle(SKETCH2_R)
        with Locations((3.107528501, -7.154248152)):
            Circle(SKETCH2_R)
        with Locations((2.104414815, -7.510754841)):
            Circle(SKETCH2_R)
        with Locations((1.062099863, -7.727350379)):
            Circle(SKETCH2_R)
        with Locations((0, -7.8)):
            Circle(SKETCH2_R)
        with Locations((-1.062099863, -7.727350379)):
            Circle(SKETCH2_R)
        with Locations((-2.104414815, -7.510754841)):
            Circle(SKETCH2_R)
        with Locations((-3.107528501, -7.154248152)):
            Circle(SKETCH2_R)
        with Locations((-4.05275481, -6.664471355)):
            Circle(SKETCH2_R)
        with Locations((-4.922485966, -6.050548067)):
            Circle(SKETCH2_R)
        with Locations((-5.700520521, -5.323914517)):
            Circle(SKETCH2_R)
        with Locations((-6.372365165, -4.498106512)):
            Circle(SKETCH2_R)
        with Locations((-6.925504704, -3.588507294)):
            Circle(SKETCH2_R)
        with Locations((-7.349635193, -2.612060975)):
            Circle(SKETCH2_R)
        with Locations((-7.636855884, -1.586956902)):
            Circle(SKETCH2_R)
        with Locations((-7.7818164, -0.532290824)):
            Circle(SKETCH2_R)
        with Locations((-7.7818164, 0.532290824)):
            Circle(SKETCH2_R)
        with Locations((-7.636855884, 1.586956902)):
            Circle(SKETCH2_R)
        with Locations((-7.349635193, 2.612060975)):
            Circle(SKETCH2_R)
        with Locations((-6.925504704, 3.588507294)):
            Circle(SKETCH2_R)
        with Locations((-6.372365165, 4.498106512)):
            Circle(SKETCH2_R)
        with Locations((-5.700520521, 5.323914517)):
            Circle(SKETCH2_R)
        with Locations((-4.922485966, 6.050548067)):
            Circle(SKETCH2_R)
        with Locations((-4.05275481, 6.664471355)):
            Circle(SKETCH2_R)
        with Locations((-3.107528501, 7.154248152)):
            Circle(SKETCH2_R)
        with Locations((-2.104414815, 7.510754841)):
            Circle(SKETCH2_R)
        with Locations((-1.062099863, 7.727350379)):
            Circle(SKETCH2_R)
    extrude(amount=-BOSS_EXTRUDE2_DEPTH)


solid = part.part
